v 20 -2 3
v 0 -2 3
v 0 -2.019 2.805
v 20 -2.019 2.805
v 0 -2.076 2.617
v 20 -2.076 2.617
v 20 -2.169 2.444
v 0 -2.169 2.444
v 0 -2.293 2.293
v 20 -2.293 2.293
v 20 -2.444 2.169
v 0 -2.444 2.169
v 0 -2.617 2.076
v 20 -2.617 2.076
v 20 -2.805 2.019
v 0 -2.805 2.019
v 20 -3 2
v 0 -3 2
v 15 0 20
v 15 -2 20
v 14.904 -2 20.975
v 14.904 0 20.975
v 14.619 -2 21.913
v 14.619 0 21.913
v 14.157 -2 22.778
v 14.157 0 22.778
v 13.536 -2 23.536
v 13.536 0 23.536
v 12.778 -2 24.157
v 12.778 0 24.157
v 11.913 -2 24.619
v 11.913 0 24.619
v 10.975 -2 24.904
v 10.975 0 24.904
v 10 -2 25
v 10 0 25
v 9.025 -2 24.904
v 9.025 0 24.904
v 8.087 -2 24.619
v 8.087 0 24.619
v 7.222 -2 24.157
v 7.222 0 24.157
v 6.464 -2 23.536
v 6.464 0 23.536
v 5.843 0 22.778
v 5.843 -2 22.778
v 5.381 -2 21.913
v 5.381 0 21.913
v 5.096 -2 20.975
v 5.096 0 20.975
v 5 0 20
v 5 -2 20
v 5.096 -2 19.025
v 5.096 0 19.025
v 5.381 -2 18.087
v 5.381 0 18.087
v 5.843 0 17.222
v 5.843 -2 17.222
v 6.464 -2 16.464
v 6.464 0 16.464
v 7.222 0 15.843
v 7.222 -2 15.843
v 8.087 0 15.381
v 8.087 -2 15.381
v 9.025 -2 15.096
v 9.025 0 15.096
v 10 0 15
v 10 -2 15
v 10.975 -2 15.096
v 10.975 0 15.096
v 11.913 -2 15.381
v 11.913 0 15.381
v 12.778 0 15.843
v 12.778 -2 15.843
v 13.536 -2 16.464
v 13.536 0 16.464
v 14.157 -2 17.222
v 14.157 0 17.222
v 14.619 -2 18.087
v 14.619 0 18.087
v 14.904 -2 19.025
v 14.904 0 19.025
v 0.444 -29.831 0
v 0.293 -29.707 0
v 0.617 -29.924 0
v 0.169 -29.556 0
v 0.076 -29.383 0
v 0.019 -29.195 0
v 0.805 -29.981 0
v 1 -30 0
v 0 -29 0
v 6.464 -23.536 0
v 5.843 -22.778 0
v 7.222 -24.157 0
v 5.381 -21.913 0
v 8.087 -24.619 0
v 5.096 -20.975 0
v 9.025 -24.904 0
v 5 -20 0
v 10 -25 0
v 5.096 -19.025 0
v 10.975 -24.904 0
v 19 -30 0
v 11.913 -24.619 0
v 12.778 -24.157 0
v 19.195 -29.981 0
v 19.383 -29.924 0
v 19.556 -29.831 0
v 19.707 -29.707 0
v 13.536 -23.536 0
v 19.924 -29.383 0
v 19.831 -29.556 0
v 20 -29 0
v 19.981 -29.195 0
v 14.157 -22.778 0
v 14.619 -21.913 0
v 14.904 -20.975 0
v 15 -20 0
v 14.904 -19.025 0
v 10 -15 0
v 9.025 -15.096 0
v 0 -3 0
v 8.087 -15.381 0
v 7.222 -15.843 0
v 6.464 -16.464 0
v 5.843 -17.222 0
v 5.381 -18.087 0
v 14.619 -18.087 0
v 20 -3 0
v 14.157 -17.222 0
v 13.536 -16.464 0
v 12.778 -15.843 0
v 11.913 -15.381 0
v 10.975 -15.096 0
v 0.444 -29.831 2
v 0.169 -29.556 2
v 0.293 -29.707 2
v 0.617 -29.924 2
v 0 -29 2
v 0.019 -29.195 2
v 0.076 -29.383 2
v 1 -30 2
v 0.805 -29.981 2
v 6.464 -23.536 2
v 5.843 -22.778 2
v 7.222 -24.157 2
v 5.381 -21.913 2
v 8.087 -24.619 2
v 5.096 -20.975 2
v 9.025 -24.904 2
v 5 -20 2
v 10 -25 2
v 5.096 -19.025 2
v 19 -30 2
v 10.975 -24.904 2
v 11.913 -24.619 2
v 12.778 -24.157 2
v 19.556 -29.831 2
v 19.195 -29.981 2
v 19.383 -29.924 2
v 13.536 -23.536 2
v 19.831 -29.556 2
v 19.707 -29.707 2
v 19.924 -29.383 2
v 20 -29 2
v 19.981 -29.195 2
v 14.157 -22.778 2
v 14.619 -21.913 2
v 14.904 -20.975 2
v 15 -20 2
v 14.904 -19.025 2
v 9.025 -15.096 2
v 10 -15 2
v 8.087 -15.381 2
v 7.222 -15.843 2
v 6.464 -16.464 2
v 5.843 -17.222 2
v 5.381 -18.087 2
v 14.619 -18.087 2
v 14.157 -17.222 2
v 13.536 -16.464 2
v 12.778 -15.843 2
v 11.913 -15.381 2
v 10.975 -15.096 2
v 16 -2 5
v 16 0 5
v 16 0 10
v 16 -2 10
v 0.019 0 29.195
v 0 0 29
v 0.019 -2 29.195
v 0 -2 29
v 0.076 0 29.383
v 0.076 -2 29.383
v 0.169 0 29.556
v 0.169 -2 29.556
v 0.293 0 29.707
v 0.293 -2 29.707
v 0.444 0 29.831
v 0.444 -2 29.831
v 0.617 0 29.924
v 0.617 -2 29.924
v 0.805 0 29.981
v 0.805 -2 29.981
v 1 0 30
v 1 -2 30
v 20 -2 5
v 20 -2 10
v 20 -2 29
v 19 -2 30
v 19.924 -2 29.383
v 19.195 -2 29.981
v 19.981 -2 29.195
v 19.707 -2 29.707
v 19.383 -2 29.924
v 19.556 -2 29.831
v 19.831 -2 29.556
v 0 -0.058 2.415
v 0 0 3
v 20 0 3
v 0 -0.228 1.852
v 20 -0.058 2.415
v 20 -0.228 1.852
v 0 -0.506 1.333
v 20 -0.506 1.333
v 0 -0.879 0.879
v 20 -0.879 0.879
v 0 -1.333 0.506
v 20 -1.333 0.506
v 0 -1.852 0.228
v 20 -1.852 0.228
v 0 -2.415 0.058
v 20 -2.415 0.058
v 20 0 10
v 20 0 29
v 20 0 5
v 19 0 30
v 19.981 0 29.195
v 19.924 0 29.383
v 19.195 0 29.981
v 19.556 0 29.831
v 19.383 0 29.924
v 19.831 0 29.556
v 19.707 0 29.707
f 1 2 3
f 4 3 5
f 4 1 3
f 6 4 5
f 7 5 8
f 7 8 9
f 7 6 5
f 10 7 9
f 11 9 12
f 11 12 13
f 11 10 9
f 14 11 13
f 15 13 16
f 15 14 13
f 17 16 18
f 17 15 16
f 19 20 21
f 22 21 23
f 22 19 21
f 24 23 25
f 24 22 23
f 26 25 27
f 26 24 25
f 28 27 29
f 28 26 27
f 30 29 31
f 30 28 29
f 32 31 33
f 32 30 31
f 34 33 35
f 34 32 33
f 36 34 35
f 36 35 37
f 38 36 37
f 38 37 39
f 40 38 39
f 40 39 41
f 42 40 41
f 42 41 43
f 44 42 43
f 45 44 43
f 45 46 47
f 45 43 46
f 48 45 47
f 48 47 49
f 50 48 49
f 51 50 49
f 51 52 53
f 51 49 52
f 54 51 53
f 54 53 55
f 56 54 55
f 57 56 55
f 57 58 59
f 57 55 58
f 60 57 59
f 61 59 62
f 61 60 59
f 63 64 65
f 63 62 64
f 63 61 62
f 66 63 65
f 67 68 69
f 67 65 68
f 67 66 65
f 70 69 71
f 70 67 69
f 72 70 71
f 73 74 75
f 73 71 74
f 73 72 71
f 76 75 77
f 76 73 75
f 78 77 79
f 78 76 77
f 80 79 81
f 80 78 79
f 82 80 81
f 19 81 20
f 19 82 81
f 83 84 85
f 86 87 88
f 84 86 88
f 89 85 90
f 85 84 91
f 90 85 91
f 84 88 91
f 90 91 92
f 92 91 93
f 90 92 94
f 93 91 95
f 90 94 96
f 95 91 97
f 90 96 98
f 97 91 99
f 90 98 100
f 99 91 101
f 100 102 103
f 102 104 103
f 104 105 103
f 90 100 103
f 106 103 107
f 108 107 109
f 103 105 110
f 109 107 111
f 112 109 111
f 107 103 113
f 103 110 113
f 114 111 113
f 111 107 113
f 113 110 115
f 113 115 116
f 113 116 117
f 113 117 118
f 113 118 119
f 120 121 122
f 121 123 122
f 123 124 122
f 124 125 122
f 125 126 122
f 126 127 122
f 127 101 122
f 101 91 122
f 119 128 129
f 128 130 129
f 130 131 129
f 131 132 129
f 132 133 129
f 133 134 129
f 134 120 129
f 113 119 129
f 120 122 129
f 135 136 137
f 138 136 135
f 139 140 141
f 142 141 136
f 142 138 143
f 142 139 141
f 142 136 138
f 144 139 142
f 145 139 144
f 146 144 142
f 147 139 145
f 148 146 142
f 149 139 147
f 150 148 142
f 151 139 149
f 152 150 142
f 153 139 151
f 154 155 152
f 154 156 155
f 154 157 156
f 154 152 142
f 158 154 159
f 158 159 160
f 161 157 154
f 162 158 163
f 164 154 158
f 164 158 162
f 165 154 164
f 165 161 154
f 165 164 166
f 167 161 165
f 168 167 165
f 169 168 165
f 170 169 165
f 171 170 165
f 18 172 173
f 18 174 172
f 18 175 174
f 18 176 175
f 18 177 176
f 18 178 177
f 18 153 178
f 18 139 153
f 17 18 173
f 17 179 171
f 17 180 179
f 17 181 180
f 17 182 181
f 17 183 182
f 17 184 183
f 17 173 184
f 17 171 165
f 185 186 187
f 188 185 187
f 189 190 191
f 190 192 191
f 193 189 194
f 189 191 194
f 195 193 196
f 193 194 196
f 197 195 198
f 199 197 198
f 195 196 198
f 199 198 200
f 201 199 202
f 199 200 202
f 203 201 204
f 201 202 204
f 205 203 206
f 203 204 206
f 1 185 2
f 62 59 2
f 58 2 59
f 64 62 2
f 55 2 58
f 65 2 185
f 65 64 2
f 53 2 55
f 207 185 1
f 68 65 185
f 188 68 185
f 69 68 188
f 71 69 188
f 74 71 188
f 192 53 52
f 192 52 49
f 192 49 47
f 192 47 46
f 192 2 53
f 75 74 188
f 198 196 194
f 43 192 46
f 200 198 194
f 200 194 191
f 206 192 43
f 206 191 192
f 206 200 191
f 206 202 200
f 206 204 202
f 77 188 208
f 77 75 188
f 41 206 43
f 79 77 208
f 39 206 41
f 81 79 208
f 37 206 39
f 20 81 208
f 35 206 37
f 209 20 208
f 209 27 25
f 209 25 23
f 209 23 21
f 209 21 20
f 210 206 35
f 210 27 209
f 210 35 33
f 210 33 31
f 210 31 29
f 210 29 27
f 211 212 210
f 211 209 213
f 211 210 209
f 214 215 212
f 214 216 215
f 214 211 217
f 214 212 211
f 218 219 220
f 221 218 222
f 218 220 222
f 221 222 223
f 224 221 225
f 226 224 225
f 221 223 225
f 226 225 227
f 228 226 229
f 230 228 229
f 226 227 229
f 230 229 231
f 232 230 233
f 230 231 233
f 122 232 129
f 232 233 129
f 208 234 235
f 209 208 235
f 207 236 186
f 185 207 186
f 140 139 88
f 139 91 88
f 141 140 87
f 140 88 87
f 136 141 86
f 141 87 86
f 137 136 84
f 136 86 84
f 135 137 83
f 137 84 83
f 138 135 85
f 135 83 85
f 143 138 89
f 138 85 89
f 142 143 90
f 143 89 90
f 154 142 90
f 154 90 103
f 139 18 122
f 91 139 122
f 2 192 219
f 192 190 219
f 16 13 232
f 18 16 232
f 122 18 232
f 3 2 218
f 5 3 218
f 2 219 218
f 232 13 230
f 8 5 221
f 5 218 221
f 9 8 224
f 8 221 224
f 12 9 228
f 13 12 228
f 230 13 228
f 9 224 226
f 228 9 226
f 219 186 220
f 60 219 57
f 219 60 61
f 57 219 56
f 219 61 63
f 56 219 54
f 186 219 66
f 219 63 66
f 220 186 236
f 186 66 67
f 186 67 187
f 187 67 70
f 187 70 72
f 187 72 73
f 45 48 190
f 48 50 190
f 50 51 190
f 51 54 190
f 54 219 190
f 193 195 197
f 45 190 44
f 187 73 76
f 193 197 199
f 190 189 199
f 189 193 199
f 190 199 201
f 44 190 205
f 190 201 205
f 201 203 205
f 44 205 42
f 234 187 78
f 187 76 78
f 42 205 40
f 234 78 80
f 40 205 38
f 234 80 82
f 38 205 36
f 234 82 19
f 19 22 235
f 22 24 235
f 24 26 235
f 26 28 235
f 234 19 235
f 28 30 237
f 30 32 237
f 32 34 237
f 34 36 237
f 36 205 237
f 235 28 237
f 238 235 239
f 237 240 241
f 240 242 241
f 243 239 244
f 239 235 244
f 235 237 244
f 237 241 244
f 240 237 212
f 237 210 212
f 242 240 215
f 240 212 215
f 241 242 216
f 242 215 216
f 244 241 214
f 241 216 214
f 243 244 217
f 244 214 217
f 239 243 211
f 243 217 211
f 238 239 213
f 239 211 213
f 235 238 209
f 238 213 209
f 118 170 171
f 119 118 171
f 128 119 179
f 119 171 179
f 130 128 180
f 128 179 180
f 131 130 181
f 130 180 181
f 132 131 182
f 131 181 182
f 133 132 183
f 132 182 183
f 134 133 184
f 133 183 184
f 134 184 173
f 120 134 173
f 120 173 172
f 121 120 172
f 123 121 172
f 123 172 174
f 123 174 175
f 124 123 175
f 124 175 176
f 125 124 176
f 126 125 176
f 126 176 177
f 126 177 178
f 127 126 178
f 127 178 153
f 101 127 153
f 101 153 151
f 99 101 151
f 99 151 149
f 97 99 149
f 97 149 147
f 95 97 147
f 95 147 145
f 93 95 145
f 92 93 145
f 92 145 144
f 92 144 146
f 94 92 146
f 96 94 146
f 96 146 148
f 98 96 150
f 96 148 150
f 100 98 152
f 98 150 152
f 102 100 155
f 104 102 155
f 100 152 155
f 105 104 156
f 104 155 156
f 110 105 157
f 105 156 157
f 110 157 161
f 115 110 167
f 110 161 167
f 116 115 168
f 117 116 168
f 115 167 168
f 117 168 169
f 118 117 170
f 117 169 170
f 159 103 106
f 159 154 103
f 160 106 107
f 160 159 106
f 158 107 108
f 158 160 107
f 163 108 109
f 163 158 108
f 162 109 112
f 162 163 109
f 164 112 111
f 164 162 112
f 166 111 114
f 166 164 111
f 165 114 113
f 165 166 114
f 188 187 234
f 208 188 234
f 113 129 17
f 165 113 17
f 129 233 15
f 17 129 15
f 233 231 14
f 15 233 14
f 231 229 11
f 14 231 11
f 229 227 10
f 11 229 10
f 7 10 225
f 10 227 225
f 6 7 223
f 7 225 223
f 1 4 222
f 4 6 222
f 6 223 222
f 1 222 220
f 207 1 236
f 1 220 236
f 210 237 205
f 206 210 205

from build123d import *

# Parameters (mm, degrees)
F0_R     = 5
F1_DEPTH = 30
F2_W     = 20
F2_H     = 28
F2_R     = 5
F3_DEPTH = 28
F4_DEPTH = 56
F5_R     = 1
F6_R     = 3
F7_R     = 1


with BuildPart() as f1:
    # F0 (on Front) → F1 (new body)
    with BuildSketch(Plane.XZ):
        Polygon((0, 30), (0, 0), (20, 0), (20, 5), (16, 5), (16, 10), (20, 10), (20, 30), align=None)
        with Locations((10, 20)):
            Circle(F0_R, mode=Mode.SUBTRACT)
    extrude(amount=F1_DEPTH)

    # F2 (on face) → F3 (cut)
    with BuildSketch(Plane.XY.offset(30)):
        with Locations((10, -16)):
            Rectangle(F2_W, F2_H)
        with Locations((10, -20)):
            Circle(F2_R, mode=Mode.SUBTRACT)
        with Locations((10, -20)):
            Circle(F2_R)
    extrude(amount=-F3_DEPTH, mode=Mode.SUBTRACT)

    # F2 (on face) → F4 (cut)
    with BuildSketch(Plane.XY.offset(30)):
        with Locations((10, -20)):
            Circle(F2_R)
    extrude(amount=-F4_DEPTH, mode=Mode.SUBTRACT)

    # F5
    f5_edges = [f1.edges().sort_by_distance(p)[0] for p in [
        (20, -30, 1),
        (0, -30, 1),
        (20, -1, 30),
        (0, -1, 30),
    ]]
    fillet(f5_edges, radius=F5_R)

    # F6
    f6_edges = [f1.edges().sort_by_distance(p)[0] for p in [
        (10, 0, 0),
    ]]
    fillet(f6_edges, radius=F6_R)

    # F7
    f7_edges = [f1.edges().sort_by_distance(p)[0] for p in [
        (10, -2, 2),
    ]]
    fillet(f7_edges, radius=F7_R)


solid = f1.part
